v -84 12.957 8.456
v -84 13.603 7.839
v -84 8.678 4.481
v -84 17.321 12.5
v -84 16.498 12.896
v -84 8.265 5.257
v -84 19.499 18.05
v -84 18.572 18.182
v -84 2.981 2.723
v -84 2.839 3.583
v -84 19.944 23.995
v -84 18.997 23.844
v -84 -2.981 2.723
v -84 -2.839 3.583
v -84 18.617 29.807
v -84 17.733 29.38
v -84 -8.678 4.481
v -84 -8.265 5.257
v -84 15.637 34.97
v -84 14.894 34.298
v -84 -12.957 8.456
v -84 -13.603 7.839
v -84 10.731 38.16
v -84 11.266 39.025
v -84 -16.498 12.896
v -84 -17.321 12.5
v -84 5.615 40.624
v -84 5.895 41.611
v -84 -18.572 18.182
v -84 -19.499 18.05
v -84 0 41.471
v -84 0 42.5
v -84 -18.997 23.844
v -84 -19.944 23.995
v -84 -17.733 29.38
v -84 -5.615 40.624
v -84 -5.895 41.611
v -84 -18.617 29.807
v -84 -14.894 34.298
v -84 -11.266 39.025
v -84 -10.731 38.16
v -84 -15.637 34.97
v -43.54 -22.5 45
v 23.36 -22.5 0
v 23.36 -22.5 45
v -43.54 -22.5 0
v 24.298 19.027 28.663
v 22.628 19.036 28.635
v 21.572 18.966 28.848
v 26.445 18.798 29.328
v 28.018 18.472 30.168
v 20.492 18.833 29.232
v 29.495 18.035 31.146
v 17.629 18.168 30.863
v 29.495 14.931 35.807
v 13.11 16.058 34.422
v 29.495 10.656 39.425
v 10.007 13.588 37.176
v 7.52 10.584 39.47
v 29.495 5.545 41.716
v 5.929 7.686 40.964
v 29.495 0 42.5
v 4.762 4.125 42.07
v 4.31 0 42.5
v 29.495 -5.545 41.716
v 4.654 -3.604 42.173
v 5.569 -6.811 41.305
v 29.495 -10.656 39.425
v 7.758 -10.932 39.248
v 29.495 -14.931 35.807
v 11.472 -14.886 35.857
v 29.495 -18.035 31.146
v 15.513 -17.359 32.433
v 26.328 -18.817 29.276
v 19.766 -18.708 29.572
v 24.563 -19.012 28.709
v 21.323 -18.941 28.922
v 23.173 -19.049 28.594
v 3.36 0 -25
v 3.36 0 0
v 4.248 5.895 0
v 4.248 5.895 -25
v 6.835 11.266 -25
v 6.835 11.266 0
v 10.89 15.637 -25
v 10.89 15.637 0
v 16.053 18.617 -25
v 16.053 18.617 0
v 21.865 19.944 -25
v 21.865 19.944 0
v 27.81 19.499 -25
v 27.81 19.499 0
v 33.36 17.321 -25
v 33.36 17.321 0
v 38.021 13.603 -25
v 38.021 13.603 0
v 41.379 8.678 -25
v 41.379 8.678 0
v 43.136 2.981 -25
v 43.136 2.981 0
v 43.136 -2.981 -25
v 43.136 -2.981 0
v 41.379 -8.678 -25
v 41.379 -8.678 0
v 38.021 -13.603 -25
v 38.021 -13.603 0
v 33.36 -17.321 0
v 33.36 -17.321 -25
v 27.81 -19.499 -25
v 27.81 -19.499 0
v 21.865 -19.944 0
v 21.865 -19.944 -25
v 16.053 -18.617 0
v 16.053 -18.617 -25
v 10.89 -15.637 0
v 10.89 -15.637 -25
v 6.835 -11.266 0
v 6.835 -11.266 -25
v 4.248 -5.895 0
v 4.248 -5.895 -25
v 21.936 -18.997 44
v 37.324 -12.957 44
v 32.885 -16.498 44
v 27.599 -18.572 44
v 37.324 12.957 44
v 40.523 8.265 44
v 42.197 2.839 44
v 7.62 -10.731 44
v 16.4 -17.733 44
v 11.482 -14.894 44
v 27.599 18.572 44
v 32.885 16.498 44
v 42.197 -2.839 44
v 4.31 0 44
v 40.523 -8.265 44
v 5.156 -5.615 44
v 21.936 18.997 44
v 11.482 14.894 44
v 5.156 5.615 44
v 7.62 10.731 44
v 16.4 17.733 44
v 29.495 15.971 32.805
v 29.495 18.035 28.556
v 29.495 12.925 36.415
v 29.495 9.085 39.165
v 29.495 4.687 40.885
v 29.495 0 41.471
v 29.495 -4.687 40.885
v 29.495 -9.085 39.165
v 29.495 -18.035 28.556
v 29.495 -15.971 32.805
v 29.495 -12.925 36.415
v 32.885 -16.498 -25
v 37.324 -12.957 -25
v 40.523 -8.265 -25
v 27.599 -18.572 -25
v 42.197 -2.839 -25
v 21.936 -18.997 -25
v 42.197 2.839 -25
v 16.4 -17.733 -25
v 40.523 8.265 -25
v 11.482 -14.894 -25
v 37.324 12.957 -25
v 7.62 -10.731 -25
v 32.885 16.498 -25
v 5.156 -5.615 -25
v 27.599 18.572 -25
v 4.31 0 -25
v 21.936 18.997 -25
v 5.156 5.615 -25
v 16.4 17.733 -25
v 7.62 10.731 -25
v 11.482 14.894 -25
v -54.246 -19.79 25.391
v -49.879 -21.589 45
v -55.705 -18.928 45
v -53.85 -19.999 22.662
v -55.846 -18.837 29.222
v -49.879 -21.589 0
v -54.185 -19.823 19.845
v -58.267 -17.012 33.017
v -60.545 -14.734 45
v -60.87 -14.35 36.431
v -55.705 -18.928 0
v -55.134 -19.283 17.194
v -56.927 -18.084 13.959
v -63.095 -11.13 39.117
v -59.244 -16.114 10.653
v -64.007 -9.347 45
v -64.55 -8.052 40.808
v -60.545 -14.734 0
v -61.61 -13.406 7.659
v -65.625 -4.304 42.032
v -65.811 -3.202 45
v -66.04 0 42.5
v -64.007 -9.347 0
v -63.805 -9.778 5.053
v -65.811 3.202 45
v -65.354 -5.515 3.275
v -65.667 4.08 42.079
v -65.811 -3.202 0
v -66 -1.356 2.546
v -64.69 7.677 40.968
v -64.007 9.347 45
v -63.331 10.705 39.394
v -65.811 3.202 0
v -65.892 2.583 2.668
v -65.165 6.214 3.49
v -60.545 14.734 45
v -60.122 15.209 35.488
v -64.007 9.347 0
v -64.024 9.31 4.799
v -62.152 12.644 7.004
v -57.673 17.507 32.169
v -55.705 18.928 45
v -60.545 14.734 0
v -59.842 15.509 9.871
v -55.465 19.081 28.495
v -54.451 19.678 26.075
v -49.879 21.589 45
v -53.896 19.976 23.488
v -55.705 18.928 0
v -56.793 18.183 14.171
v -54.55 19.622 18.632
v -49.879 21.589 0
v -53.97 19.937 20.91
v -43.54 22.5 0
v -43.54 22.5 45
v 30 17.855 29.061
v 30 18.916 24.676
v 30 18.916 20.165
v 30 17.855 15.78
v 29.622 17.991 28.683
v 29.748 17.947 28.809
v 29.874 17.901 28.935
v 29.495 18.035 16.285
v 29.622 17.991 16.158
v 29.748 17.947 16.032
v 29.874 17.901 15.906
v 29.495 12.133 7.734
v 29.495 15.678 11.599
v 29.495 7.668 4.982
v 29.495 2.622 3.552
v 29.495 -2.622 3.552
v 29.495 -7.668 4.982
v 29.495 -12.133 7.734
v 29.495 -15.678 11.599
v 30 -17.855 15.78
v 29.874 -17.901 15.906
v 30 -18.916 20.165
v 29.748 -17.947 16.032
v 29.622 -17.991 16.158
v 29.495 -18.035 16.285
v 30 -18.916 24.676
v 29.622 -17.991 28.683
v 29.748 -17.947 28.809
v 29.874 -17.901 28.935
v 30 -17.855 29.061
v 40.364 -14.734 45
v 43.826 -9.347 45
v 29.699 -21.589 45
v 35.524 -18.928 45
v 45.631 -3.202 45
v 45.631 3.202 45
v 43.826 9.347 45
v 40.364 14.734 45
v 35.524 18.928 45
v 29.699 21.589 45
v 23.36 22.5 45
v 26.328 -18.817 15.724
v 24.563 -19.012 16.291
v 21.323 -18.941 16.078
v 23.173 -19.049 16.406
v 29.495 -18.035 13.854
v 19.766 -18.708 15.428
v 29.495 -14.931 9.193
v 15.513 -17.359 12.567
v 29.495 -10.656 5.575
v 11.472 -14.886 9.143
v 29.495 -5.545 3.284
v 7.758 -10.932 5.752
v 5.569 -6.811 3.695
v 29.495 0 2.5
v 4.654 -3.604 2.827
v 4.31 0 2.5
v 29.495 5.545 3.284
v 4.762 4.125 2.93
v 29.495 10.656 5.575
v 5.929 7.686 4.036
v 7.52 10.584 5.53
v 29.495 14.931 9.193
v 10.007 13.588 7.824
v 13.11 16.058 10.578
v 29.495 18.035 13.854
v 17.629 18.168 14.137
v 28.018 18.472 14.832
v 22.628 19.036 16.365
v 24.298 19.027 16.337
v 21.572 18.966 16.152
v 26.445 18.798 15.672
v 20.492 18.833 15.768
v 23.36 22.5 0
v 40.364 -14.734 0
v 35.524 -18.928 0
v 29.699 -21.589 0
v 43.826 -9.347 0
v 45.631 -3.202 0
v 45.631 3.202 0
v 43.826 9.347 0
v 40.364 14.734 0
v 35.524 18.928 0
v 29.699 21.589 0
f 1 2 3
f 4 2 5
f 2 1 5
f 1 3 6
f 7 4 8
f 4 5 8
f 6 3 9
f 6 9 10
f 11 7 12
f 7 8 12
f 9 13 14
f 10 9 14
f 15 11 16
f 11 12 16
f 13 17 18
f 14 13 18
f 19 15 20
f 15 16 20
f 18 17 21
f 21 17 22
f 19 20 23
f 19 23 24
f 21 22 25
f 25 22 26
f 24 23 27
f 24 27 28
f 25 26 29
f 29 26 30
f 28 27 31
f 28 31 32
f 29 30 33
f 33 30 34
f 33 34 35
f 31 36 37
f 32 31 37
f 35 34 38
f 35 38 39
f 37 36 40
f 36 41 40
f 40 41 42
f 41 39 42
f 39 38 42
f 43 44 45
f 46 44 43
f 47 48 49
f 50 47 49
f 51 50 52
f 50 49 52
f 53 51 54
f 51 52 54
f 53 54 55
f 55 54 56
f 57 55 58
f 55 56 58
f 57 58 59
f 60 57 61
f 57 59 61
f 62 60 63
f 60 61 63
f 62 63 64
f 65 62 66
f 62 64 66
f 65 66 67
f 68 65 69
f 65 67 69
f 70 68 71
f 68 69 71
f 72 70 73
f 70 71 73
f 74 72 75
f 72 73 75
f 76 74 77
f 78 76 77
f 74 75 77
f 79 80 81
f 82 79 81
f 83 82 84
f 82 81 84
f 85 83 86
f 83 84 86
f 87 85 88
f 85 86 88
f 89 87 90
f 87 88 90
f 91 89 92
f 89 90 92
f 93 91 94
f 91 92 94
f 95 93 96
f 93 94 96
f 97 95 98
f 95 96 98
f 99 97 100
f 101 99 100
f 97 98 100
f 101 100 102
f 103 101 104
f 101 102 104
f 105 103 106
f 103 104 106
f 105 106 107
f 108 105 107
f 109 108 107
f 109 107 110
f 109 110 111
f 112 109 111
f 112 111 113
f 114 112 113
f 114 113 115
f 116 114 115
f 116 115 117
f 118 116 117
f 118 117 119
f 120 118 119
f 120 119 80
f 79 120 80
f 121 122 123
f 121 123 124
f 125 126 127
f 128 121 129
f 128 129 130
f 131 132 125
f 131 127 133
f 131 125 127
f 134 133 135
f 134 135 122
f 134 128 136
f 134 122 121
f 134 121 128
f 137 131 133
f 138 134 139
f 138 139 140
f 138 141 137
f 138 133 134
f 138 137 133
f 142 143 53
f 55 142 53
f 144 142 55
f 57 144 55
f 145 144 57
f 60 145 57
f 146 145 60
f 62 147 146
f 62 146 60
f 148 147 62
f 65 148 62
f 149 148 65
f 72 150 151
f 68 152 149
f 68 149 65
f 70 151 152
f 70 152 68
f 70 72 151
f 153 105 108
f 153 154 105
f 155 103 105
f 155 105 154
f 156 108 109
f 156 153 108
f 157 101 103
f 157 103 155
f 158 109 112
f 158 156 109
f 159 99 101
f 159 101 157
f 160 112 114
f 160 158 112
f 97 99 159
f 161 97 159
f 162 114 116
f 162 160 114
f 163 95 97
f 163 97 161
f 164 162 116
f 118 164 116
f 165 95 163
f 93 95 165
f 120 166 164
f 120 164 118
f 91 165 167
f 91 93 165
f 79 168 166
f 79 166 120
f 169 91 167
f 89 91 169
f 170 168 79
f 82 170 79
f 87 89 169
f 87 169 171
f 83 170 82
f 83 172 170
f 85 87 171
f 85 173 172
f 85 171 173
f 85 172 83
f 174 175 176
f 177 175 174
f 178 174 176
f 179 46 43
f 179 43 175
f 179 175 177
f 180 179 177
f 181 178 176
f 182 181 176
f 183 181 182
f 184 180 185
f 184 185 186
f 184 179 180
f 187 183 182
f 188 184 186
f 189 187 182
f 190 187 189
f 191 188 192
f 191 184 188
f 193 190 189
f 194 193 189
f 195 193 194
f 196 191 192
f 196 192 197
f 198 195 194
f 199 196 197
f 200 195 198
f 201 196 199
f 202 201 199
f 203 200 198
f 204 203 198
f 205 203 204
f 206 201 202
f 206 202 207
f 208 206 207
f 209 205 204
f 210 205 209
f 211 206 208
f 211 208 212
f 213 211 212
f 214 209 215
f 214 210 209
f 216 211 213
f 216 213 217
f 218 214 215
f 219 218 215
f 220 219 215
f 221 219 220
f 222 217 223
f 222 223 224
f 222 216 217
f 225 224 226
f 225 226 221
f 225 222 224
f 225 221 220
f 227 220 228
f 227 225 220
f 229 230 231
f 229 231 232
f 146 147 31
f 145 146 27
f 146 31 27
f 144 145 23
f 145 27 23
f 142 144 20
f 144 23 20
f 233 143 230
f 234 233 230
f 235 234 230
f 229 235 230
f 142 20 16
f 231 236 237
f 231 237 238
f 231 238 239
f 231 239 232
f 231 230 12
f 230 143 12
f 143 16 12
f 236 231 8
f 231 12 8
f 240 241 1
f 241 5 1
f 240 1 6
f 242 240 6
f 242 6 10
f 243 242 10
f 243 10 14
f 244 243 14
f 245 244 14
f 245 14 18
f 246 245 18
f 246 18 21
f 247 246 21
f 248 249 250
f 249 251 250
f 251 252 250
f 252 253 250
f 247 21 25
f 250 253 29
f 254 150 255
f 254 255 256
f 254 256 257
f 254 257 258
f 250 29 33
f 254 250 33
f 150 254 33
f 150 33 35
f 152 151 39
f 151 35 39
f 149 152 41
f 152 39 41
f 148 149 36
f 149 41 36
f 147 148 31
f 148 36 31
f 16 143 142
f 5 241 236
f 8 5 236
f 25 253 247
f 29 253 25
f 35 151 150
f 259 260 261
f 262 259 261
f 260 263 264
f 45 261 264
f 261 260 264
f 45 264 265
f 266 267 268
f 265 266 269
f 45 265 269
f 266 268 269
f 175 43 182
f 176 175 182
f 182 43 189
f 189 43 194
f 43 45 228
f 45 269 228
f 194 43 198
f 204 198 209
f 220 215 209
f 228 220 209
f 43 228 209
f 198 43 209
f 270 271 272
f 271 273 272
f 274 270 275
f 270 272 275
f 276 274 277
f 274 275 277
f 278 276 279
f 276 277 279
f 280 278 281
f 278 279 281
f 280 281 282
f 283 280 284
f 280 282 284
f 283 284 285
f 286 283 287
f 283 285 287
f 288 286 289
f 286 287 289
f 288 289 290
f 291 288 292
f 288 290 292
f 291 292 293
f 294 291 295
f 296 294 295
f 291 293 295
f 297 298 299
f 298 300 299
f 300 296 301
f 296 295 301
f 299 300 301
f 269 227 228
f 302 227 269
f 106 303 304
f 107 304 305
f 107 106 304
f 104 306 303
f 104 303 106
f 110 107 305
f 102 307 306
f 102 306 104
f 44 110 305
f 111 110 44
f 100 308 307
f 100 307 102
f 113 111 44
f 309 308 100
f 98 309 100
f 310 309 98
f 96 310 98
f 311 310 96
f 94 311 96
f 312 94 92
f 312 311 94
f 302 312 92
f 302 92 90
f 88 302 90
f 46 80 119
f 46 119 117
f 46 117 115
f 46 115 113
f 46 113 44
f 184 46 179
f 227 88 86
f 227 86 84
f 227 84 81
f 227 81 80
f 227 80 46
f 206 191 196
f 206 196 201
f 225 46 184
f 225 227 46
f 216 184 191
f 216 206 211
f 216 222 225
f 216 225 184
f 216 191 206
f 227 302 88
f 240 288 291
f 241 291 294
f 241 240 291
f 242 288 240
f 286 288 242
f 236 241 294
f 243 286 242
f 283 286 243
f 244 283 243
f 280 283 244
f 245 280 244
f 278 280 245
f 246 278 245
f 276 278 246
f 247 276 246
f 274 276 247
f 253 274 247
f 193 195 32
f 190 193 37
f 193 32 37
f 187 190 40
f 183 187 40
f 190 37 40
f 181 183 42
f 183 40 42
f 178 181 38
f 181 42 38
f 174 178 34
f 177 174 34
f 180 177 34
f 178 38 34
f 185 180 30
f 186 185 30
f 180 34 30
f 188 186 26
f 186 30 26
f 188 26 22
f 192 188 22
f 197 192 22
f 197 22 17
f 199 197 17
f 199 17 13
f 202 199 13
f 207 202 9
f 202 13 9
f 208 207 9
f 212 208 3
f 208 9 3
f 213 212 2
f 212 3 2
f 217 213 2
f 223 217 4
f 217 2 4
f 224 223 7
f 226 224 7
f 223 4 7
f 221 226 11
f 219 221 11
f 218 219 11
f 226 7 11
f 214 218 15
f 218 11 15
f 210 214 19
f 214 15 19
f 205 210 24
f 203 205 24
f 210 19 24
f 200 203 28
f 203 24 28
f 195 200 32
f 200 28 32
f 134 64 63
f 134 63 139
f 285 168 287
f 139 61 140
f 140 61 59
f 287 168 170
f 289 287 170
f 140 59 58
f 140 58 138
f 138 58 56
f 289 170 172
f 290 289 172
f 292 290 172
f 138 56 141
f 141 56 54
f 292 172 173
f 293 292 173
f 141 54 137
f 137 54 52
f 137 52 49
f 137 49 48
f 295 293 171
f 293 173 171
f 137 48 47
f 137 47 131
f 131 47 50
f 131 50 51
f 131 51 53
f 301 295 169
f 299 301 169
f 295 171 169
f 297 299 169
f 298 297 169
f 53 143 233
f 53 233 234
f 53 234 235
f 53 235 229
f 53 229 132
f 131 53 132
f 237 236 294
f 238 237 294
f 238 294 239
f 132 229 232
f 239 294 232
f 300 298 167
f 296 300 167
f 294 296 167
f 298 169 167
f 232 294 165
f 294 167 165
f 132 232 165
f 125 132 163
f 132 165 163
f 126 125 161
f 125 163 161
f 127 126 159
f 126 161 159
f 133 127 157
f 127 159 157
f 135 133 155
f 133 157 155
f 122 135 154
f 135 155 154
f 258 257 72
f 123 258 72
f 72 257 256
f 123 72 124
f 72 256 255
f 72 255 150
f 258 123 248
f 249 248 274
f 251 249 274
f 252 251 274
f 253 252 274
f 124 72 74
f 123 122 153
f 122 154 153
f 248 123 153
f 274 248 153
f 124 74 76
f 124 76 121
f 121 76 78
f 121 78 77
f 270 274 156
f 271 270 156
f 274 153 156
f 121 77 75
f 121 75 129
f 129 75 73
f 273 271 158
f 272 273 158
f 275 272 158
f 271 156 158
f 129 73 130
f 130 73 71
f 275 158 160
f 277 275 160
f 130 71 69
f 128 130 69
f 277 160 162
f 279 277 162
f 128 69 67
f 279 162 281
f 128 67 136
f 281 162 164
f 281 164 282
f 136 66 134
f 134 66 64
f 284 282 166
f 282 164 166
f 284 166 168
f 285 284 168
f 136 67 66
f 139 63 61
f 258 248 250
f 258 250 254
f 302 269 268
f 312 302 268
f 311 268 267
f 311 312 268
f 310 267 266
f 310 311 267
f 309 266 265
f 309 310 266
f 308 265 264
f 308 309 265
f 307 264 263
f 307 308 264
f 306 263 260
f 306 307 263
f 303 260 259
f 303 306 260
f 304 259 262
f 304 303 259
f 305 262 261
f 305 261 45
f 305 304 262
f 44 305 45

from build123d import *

# Parameters (mm, degrees)
SALIENTE_EXTRUIR1_DEPTH      = 45
SALIENTE_EXTRUIR2_DEPTH      = 25
SALIENTE_EXTRUIR2_DEPTH_BACK = 45
CROQUIS2_R                   = 20
CROQUIS4_R                   = 19.05
CORTAR_EXTRUIR3_DEPTH        = 69
SALIENTE_EXTRUIR3_DEPTH      = 29.495391503
SALIENTE_EXTRUIR3_DEPTH_BACK = 84
CROQUIS5_R                   = 20
CROQUIS8_R                   = 19.05
CORTAR_EXTRUIR6_DEPTH        = 114


with BuildPart() as part:
    # Croquis1 → Saliente-Extruir1 (new body)
    with BuildSketch(Plane.XY):
        with BuildLine():
            Line((-43.5404787, 22.5), (23.3595213, 22.5))
            ThreePointArc((23.3595213, 22.5), (45.8595213, 0), (23.3595213, -22.5))
            Line((23.3595213, -22.5), (-43.5404787, -22.5))
            ThreePointArc((-43.5404787, -22.5), (-66.0404787, 0), (-43.5404787, 22.5))
        make_face()
    extrude(amount=SALIENTE_EXTRUIR1_DEPTH)

    # Croquis2 → Saliente-Extruir2 (add, two sides: drawn at the far end of the back side and taken through both)
    with BuildSketch(Plane(origin=(0, 0, 0), x_dir=(-1, 0, 0), z_dir=(0, 0, -1)).offset(-SALIENTE_EXTRUIR2_DEPTH_BACK)):
        with Locations((-23.3595213, 0)):
            Circle(CROQUIS2_R)
    extrude(amount=SALIENTE_EXTRUIR2_DEPTH + SALIENTE_EXTRUIR2_DEPTH_BACK)

    # Croquis4 → Cortar-Extruir3 (cut)
    with BuildSketch(Plane(origin=(0, 0, -25), x_dir=(-1, 0, 0), z_dir=(0, 0, -1))):
        with Locations((-23.3595213, 0)):
            Circle(CROQUIS4_R)
    extrude(amount=-CORTAR_EXTRUIR3_DEPTH, mode=Mode.SUBTRACT)

    # Croquis5 → Saliente-Extruir3 (add, two sides: drawn at the far end of the back side and taken through both)
    with BuildSketch(Plane(origin=(0, 0, 0), x_dir=(0, 0, -1), z_dir=(1, 0, 0)).offset(-SALIENTE_EXTRUIR3_DEPTH_BACK)):
        with Locations(Location((-22.5, 0, 0), (0, 0, 180))):
            Circle(CROQUIS5_R)
    extrude(amount=SALIENTE_EXTRUIR3_DEPTH + SALIENTE_EXTRUIR3_DEPTH_BACK)

    # Croquis8 → Cortar-Extruir6 (cut)
    with BuildSketch(Plane.ZY.offset(84)):
        with Locations((22.4205324, 0)):
            Circle(CROQUIS8_R)
    extrude(amount=-CORTAR_EXTRUIR6_DEPTH, mode=Mode.SUBTRACT)


solid = part.part
